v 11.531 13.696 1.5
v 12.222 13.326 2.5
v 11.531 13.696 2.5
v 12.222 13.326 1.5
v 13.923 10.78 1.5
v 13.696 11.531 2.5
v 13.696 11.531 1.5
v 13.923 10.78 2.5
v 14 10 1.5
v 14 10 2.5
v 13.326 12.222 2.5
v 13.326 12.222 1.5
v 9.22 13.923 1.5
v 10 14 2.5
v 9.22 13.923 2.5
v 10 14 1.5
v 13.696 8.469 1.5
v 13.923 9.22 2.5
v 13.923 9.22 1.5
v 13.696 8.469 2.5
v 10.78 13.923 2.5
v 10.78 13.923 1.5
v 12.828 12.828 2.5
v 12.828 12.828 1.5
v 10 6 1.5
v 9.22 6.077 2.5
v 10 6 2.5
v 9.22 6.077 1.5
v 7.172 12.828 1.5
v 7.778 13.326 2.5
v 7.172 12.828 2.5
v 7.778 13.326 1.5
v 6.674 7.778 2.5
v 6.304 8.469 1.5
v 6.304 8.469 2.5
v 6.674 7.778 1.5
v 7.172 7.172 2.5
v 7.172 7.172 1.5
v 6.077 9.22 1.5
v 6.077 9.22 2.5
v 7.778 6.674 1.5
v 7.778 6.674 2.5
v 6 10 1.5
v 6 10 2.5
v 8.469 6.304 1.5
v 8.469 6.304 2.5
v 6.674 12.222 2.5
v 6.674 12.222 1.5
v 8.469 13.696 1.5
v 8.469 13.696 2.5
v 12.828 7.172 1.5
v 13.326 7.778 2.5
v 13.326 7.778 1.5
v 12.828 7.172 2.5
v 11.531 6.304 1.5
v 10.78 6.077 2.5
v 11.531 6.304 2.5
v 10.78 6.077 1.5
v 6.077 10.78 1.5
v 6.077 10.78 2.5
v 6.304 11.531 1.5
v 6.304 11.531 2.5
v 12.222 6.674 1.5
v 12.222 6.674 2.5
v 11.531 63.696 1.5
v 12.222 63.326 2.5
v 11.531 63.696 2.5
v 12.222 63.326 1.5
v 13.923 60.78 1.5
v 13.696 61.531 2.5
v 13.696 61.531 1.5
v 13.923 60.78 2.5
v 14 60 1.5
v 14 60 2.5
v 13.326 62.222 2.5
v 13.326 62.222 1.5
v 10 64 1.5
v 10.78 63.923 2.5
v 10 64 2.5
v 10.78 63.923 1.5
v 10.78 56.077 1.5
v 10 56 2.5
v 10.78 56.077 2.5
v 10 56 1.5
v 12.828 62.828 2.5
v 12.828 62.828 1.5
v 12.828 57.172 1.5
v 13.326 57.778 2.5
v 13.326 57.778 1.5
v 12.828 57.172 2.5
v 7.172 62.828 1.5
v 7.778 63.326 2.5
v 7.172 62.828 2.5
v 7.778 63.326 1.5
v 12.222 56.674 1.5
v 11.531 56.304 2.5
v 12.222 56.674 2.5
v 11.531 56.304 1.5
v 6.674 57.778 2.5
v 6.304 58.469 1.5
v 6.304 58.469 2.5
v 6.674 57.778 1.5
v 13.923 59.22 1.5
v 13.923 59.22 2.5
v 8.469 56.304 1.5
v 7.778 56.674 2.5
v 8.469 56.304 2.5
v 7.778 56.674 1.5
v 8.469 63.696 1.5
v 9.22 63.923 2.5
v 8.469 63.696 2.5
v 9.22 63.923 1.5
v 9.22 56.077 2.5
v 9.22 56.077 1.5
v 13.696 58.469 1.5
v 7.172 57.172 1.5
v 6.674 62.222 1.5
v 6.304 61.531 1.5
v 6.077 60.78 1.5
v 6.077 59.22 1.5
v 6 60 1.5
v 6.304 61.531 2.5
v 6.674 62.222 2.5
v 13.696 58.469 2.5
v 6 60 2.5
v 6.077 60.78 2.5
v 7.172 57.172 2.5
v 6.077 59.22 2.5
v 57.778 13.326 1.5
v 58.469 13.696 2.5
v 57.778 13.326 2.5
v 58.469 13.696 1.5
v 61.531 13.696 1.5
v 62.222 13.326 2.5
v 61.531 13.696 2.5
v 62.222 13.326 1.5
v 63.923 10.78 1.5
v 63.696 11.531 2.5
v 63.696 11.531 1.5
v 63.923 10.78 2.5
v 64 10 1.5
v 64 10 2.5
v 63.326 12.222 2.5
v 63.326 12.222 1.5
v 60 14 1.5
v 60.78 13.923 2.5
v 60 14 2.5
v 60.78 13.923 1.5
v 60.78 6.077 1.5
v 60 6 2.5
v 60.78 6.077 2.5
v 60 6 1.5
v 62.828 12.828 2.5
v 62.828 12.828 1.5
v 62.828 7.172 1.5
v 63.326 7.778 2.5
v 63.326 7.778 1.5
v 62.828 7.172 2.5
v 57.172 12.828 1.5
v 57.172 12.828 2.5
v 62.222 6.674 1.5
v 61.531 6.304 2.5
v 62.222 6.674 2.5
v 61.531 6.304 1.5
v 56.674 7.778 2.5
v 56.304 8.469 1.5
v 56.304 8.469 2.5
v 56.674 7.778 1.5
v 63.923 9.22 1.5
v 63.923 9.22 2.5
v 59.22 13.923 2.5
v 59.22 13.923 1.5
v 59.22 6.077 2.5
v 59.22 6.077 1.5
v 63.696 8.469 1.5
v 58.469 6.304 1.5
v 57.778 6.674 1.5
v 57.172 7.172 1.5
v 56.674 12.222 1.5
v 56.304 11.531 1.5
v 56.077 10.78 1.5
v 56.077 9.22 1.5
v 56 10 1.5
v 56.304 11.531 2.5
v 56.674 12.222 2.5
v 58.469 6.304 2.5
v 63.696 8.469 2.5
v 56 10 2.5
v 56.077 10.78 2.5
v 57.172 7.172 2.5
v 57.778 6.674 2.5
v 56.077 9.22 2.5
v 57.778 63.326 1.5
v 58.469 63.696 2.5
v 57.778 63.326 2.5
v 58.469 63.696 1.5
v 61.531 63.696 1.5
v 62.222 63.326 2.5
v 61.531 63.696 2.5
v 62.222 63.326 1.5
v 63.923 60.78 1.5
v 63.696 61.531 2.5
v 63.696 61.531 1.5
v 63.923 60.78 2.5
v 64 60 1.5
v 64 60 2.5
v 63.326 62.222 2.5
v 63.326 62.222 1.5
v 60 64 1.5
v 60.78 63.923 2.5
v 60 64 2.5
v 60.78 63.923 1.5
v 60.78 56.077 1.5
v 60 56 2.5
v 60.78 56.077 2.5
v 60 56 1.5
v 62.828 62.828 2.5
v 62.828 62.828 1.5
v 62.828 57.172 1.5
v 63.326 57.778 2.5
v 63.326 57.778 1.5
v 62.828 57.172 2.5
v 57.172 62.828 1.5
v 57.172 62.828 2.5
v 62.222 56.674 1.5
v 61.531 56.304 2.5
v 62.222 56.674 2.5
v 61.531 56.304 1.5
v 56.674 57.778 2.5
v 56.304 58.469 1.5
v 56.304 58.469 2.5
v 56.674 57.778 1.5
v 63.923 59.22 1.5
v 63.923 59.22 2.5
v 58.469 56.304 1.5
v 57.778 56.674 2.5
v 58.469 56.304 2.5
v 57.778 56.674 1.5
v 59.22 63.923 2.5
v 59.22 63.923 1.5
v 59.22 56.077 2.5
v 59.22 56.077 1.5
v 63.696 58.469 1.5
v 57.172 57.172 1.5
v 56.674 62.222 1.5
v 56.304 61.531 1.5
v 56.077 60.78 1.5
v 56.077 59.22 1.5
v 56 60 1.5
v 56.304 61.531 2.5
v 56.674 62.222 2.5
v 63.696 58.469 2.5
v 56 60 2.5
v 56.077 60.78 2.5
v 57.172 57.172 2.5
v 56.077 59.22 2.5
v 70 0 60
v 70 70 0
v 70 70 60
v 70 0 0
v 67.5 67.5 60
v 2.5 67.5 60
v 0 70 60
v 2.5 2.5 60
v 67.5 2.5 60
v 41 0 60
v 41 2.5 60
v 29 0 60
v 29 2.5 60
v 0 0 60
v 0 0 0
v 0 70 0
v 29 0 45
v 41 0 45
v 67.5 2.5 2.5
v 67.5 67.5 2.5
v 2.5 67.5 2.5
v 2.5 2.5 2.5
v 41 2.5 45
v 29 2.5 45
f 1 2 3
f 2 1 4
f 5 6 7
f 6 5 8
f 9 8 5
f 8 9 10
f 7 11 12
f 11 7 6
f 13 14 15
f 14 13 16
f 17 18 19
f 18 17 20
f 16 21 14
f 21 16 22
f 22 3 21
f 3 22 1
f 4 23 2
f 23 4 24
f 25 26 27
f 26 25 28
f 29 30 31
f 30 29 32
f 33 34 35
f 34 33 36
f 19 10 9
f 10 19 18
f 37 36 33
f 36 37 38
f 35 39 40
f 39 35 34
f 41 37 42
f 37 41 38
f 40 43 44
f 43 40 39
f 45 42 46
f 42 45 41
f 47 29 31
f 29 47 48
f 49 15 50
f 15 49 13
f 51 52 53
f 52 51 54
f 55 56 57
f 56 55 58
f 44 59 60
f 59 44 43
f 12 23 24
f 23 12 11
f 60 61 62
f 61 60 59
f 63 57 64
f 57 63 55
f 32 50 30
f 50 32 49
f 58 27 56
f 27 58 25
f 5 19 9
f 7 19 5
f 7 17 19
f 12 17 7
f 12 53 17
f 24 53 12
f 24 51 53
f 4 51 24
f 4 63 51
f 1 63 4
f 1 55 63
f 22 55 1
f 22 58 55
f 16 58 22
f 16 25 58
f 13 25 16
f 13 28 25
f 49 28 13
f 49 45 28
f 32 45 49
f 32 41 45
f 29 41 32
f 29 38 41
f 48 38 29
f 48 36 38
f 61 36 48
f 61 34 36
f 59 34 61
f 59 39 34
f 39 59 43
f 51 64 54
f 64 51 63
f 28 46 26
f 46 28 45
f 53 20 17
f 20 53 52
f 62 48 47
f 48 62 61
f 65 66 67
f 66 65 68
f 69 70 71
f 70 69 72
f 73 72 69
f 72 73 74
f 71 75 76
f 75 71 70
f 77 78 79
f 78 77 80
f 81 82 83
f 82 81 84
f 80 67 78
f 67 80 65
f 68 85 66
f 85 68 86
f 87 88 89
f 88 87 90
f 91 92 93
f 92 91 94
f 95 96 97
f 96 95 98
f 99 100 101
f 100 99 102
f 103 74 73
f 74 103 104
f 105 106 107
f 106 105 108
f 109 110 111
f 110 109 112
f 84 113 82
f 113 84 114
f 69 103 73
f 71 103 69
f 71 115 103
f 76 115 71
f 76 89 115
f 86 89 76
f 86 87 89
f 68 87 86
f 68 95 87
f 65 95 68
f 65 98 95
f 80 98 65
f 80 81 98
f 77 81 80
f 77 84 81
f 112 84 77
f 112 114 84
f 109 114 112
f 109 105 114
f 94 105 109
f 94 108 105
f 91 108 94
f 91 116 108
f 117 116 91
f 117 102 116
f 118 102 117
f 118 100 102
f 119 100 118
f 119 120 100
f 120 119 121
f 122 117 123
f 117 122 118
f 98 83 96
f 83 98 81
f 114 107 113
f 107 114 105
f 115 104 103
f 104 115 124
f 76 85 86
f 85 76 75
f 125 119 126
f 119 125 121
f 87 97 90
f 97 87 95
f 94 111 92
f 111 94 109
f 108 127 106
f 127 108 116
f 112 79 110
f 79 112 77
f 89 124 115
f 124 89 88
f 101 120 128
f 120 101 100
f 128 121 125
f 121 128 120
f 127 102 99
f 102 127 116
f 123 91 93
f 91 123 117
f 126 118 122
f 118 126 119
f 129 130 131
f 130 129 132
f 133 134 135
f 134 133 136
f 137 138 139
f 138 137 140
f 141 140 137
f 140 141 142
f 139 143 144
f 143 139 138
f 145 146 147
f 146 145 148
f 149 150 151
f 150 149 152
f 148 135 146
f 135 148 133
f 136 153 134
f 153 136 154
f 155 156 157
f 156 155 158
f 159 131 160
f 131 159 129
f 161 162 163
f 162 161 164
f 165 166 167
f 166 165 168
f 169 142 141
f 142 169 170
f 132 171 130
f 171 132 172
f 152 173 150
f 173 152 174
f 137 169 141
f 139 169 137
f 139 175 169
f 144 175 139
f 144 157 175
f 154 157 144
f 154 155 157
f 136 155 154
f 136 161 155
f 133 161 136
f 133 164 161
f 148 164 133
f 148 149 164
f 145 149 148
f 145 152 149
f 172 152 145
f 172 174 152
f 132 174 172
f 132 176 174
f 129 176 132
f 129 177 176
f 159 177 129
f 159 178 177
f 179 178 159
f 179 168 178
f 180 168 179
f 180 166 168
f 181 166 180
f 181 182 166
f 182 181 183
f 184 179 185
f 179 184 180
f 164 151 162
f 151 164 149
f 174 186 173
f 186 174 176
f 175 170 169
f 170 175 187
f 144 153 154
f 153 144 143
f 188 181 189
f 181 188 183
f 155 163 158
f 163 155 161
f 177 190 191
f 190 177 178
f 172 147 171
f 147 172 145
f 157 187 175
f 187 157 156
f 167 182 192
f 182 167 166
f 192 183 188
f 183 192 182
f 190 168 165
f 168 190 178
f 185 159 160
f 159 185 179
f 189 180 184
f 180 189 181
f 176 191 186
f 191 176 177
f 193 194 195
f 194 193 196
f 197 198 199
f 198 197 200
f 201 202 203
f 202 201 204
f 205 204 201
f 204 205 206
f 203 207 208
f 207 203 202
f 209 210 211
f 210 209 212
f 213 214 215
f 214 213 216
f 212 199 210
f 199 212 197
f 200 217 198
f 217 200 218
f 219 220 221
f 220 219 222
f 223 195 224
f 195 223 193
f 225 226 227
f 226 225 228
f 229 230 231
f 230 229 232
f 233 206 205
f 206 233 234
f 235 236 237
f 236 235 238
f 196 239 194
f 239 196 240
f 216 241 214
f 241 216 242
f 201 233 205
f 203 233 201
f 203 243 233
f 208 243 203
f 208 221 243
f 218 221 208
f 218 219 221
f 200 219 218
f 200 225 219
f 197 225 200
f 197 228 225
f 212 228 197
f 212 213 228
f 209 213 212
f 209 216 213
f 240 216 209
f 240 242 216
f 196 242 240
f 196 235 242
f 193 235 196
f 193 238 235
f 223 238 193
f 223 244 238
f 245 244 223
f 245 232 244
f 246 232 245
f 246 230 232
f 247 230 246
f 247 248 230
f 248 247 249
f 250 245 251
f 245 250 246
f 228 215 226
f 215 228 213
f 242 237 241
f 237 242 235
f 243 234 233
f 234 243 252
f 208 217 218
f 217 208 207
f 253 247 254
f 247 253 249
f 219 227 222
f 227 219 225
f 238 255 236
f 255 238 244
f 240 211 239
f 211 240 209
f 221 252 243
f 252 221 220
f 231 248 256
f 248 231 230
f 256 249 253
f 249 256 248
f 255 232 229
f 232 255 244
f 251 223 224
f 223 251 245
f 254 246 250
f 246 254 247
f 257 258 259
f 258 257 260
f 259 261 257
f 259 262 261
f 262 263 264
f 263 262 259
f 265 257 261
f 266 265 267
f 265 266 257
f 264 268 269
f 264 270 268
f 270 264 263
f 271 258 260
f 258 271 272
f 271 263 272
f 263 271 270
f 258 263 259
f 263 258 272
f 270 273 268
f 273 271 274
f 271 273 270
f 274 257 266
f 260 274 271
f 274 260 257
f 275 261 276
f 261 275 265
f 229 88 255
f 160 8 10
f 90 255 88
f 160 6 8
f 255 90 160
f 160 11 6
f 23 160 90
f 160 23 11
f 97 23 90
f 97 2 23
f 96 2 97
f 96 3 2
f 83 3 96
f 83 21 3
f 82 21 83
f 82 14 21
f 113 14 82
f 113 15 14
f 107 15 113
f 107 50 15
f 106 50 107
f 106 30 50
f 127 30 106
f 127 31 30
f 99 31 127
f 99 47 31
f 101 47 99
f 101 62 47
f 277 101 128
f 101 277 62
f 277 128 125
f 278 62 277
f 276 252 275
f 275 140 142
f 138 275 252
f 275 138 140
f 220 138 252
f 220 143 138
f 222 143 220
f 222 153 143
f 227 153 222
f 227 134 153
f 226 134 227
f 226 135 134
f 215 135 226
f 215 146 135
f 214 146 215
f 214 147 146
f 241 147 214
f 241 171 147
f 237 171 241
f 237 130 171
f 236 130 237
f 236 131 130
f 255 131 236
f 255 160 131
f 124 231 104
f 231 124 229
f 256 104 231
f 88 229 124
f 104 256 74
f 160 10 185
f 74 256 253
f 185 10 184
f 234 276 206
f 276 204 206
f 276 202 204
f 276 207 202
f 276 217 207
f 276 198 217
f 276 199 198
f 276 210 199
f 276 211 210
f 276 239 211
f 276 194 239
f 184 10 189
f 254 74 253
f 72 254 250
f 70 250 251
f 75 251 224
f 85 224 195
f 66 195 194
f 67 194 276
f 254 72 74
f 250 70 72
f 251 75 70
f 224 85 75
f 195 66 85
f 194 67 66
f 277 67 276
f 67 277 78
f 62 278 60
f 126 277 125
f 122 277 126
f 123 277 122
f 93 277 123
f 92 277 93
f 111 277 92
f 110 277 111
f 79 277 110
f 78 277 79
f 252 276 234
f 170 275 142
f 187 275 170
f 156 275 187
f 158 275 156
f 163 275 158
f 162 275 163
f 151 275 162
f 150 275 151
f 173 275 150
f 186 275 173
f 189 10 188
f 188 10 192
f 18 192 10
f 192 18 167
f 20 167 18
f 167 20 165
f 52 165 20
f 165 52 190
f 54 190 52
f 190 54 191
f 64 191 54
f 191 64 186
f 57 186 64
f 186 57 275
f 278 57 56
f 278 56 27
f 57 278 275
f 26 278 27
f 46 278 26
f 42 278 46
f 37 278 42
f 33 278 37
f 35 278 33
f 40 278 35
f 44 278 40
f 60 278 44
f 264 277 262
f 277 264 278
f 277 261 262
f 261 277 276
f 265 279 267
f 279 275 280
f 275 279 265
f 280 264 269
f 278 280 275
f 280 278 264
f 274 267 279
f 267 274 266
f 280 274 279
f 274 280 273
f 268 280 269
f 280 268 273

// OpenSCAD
$fn = 32;

// ----------------------------------------------------------------------
// Enclosure box: both enclosure
// ----------------------------------------------------------------------

// --- parameters (mm) ---
box_l = 70;               // outer length, X
box_w = 70;               // outer width, Y
box_h = 60;               // outer height
wall_t = 2.5;             // wall thickness
boss_r = 4;               // corner boss radius
hole_r = 2;               // boss screw hole radius
boss_in = 10;             // boss inset from the corners
notch_w = 12;             // cable notch width
notch_h = 15;             // cable notch height

inner_h = box_h - wall_t;  // cavity depth
boss_h = inner_h - 2;  // corner boss height

difference() {
  cube([box_l, box_w, box_h]);
  translate([wall_t, wall_t, wall_t])
    cube([box_l - 2 * wall_t, box_w - 2 * wall_t, box_h]);
  for (sx = [0, 1], sy = [0, 1])
    translate([sx ? box_l - boss_in : boss_in,
               sy ? box_w - boss_in : boss_in, wall_t - 1]) {
      cylinder(r = boss_r, h = boss_h);
      translate([0, 0, boss_h - 4])
        cylinder(r = hole_r, h = 5);
    }
  translate([box_l / 2 - notch_w / 2, -1, box_h - notch_h])
    cube([notch_w, wall_t + 2, notch_h + 1]);
}
